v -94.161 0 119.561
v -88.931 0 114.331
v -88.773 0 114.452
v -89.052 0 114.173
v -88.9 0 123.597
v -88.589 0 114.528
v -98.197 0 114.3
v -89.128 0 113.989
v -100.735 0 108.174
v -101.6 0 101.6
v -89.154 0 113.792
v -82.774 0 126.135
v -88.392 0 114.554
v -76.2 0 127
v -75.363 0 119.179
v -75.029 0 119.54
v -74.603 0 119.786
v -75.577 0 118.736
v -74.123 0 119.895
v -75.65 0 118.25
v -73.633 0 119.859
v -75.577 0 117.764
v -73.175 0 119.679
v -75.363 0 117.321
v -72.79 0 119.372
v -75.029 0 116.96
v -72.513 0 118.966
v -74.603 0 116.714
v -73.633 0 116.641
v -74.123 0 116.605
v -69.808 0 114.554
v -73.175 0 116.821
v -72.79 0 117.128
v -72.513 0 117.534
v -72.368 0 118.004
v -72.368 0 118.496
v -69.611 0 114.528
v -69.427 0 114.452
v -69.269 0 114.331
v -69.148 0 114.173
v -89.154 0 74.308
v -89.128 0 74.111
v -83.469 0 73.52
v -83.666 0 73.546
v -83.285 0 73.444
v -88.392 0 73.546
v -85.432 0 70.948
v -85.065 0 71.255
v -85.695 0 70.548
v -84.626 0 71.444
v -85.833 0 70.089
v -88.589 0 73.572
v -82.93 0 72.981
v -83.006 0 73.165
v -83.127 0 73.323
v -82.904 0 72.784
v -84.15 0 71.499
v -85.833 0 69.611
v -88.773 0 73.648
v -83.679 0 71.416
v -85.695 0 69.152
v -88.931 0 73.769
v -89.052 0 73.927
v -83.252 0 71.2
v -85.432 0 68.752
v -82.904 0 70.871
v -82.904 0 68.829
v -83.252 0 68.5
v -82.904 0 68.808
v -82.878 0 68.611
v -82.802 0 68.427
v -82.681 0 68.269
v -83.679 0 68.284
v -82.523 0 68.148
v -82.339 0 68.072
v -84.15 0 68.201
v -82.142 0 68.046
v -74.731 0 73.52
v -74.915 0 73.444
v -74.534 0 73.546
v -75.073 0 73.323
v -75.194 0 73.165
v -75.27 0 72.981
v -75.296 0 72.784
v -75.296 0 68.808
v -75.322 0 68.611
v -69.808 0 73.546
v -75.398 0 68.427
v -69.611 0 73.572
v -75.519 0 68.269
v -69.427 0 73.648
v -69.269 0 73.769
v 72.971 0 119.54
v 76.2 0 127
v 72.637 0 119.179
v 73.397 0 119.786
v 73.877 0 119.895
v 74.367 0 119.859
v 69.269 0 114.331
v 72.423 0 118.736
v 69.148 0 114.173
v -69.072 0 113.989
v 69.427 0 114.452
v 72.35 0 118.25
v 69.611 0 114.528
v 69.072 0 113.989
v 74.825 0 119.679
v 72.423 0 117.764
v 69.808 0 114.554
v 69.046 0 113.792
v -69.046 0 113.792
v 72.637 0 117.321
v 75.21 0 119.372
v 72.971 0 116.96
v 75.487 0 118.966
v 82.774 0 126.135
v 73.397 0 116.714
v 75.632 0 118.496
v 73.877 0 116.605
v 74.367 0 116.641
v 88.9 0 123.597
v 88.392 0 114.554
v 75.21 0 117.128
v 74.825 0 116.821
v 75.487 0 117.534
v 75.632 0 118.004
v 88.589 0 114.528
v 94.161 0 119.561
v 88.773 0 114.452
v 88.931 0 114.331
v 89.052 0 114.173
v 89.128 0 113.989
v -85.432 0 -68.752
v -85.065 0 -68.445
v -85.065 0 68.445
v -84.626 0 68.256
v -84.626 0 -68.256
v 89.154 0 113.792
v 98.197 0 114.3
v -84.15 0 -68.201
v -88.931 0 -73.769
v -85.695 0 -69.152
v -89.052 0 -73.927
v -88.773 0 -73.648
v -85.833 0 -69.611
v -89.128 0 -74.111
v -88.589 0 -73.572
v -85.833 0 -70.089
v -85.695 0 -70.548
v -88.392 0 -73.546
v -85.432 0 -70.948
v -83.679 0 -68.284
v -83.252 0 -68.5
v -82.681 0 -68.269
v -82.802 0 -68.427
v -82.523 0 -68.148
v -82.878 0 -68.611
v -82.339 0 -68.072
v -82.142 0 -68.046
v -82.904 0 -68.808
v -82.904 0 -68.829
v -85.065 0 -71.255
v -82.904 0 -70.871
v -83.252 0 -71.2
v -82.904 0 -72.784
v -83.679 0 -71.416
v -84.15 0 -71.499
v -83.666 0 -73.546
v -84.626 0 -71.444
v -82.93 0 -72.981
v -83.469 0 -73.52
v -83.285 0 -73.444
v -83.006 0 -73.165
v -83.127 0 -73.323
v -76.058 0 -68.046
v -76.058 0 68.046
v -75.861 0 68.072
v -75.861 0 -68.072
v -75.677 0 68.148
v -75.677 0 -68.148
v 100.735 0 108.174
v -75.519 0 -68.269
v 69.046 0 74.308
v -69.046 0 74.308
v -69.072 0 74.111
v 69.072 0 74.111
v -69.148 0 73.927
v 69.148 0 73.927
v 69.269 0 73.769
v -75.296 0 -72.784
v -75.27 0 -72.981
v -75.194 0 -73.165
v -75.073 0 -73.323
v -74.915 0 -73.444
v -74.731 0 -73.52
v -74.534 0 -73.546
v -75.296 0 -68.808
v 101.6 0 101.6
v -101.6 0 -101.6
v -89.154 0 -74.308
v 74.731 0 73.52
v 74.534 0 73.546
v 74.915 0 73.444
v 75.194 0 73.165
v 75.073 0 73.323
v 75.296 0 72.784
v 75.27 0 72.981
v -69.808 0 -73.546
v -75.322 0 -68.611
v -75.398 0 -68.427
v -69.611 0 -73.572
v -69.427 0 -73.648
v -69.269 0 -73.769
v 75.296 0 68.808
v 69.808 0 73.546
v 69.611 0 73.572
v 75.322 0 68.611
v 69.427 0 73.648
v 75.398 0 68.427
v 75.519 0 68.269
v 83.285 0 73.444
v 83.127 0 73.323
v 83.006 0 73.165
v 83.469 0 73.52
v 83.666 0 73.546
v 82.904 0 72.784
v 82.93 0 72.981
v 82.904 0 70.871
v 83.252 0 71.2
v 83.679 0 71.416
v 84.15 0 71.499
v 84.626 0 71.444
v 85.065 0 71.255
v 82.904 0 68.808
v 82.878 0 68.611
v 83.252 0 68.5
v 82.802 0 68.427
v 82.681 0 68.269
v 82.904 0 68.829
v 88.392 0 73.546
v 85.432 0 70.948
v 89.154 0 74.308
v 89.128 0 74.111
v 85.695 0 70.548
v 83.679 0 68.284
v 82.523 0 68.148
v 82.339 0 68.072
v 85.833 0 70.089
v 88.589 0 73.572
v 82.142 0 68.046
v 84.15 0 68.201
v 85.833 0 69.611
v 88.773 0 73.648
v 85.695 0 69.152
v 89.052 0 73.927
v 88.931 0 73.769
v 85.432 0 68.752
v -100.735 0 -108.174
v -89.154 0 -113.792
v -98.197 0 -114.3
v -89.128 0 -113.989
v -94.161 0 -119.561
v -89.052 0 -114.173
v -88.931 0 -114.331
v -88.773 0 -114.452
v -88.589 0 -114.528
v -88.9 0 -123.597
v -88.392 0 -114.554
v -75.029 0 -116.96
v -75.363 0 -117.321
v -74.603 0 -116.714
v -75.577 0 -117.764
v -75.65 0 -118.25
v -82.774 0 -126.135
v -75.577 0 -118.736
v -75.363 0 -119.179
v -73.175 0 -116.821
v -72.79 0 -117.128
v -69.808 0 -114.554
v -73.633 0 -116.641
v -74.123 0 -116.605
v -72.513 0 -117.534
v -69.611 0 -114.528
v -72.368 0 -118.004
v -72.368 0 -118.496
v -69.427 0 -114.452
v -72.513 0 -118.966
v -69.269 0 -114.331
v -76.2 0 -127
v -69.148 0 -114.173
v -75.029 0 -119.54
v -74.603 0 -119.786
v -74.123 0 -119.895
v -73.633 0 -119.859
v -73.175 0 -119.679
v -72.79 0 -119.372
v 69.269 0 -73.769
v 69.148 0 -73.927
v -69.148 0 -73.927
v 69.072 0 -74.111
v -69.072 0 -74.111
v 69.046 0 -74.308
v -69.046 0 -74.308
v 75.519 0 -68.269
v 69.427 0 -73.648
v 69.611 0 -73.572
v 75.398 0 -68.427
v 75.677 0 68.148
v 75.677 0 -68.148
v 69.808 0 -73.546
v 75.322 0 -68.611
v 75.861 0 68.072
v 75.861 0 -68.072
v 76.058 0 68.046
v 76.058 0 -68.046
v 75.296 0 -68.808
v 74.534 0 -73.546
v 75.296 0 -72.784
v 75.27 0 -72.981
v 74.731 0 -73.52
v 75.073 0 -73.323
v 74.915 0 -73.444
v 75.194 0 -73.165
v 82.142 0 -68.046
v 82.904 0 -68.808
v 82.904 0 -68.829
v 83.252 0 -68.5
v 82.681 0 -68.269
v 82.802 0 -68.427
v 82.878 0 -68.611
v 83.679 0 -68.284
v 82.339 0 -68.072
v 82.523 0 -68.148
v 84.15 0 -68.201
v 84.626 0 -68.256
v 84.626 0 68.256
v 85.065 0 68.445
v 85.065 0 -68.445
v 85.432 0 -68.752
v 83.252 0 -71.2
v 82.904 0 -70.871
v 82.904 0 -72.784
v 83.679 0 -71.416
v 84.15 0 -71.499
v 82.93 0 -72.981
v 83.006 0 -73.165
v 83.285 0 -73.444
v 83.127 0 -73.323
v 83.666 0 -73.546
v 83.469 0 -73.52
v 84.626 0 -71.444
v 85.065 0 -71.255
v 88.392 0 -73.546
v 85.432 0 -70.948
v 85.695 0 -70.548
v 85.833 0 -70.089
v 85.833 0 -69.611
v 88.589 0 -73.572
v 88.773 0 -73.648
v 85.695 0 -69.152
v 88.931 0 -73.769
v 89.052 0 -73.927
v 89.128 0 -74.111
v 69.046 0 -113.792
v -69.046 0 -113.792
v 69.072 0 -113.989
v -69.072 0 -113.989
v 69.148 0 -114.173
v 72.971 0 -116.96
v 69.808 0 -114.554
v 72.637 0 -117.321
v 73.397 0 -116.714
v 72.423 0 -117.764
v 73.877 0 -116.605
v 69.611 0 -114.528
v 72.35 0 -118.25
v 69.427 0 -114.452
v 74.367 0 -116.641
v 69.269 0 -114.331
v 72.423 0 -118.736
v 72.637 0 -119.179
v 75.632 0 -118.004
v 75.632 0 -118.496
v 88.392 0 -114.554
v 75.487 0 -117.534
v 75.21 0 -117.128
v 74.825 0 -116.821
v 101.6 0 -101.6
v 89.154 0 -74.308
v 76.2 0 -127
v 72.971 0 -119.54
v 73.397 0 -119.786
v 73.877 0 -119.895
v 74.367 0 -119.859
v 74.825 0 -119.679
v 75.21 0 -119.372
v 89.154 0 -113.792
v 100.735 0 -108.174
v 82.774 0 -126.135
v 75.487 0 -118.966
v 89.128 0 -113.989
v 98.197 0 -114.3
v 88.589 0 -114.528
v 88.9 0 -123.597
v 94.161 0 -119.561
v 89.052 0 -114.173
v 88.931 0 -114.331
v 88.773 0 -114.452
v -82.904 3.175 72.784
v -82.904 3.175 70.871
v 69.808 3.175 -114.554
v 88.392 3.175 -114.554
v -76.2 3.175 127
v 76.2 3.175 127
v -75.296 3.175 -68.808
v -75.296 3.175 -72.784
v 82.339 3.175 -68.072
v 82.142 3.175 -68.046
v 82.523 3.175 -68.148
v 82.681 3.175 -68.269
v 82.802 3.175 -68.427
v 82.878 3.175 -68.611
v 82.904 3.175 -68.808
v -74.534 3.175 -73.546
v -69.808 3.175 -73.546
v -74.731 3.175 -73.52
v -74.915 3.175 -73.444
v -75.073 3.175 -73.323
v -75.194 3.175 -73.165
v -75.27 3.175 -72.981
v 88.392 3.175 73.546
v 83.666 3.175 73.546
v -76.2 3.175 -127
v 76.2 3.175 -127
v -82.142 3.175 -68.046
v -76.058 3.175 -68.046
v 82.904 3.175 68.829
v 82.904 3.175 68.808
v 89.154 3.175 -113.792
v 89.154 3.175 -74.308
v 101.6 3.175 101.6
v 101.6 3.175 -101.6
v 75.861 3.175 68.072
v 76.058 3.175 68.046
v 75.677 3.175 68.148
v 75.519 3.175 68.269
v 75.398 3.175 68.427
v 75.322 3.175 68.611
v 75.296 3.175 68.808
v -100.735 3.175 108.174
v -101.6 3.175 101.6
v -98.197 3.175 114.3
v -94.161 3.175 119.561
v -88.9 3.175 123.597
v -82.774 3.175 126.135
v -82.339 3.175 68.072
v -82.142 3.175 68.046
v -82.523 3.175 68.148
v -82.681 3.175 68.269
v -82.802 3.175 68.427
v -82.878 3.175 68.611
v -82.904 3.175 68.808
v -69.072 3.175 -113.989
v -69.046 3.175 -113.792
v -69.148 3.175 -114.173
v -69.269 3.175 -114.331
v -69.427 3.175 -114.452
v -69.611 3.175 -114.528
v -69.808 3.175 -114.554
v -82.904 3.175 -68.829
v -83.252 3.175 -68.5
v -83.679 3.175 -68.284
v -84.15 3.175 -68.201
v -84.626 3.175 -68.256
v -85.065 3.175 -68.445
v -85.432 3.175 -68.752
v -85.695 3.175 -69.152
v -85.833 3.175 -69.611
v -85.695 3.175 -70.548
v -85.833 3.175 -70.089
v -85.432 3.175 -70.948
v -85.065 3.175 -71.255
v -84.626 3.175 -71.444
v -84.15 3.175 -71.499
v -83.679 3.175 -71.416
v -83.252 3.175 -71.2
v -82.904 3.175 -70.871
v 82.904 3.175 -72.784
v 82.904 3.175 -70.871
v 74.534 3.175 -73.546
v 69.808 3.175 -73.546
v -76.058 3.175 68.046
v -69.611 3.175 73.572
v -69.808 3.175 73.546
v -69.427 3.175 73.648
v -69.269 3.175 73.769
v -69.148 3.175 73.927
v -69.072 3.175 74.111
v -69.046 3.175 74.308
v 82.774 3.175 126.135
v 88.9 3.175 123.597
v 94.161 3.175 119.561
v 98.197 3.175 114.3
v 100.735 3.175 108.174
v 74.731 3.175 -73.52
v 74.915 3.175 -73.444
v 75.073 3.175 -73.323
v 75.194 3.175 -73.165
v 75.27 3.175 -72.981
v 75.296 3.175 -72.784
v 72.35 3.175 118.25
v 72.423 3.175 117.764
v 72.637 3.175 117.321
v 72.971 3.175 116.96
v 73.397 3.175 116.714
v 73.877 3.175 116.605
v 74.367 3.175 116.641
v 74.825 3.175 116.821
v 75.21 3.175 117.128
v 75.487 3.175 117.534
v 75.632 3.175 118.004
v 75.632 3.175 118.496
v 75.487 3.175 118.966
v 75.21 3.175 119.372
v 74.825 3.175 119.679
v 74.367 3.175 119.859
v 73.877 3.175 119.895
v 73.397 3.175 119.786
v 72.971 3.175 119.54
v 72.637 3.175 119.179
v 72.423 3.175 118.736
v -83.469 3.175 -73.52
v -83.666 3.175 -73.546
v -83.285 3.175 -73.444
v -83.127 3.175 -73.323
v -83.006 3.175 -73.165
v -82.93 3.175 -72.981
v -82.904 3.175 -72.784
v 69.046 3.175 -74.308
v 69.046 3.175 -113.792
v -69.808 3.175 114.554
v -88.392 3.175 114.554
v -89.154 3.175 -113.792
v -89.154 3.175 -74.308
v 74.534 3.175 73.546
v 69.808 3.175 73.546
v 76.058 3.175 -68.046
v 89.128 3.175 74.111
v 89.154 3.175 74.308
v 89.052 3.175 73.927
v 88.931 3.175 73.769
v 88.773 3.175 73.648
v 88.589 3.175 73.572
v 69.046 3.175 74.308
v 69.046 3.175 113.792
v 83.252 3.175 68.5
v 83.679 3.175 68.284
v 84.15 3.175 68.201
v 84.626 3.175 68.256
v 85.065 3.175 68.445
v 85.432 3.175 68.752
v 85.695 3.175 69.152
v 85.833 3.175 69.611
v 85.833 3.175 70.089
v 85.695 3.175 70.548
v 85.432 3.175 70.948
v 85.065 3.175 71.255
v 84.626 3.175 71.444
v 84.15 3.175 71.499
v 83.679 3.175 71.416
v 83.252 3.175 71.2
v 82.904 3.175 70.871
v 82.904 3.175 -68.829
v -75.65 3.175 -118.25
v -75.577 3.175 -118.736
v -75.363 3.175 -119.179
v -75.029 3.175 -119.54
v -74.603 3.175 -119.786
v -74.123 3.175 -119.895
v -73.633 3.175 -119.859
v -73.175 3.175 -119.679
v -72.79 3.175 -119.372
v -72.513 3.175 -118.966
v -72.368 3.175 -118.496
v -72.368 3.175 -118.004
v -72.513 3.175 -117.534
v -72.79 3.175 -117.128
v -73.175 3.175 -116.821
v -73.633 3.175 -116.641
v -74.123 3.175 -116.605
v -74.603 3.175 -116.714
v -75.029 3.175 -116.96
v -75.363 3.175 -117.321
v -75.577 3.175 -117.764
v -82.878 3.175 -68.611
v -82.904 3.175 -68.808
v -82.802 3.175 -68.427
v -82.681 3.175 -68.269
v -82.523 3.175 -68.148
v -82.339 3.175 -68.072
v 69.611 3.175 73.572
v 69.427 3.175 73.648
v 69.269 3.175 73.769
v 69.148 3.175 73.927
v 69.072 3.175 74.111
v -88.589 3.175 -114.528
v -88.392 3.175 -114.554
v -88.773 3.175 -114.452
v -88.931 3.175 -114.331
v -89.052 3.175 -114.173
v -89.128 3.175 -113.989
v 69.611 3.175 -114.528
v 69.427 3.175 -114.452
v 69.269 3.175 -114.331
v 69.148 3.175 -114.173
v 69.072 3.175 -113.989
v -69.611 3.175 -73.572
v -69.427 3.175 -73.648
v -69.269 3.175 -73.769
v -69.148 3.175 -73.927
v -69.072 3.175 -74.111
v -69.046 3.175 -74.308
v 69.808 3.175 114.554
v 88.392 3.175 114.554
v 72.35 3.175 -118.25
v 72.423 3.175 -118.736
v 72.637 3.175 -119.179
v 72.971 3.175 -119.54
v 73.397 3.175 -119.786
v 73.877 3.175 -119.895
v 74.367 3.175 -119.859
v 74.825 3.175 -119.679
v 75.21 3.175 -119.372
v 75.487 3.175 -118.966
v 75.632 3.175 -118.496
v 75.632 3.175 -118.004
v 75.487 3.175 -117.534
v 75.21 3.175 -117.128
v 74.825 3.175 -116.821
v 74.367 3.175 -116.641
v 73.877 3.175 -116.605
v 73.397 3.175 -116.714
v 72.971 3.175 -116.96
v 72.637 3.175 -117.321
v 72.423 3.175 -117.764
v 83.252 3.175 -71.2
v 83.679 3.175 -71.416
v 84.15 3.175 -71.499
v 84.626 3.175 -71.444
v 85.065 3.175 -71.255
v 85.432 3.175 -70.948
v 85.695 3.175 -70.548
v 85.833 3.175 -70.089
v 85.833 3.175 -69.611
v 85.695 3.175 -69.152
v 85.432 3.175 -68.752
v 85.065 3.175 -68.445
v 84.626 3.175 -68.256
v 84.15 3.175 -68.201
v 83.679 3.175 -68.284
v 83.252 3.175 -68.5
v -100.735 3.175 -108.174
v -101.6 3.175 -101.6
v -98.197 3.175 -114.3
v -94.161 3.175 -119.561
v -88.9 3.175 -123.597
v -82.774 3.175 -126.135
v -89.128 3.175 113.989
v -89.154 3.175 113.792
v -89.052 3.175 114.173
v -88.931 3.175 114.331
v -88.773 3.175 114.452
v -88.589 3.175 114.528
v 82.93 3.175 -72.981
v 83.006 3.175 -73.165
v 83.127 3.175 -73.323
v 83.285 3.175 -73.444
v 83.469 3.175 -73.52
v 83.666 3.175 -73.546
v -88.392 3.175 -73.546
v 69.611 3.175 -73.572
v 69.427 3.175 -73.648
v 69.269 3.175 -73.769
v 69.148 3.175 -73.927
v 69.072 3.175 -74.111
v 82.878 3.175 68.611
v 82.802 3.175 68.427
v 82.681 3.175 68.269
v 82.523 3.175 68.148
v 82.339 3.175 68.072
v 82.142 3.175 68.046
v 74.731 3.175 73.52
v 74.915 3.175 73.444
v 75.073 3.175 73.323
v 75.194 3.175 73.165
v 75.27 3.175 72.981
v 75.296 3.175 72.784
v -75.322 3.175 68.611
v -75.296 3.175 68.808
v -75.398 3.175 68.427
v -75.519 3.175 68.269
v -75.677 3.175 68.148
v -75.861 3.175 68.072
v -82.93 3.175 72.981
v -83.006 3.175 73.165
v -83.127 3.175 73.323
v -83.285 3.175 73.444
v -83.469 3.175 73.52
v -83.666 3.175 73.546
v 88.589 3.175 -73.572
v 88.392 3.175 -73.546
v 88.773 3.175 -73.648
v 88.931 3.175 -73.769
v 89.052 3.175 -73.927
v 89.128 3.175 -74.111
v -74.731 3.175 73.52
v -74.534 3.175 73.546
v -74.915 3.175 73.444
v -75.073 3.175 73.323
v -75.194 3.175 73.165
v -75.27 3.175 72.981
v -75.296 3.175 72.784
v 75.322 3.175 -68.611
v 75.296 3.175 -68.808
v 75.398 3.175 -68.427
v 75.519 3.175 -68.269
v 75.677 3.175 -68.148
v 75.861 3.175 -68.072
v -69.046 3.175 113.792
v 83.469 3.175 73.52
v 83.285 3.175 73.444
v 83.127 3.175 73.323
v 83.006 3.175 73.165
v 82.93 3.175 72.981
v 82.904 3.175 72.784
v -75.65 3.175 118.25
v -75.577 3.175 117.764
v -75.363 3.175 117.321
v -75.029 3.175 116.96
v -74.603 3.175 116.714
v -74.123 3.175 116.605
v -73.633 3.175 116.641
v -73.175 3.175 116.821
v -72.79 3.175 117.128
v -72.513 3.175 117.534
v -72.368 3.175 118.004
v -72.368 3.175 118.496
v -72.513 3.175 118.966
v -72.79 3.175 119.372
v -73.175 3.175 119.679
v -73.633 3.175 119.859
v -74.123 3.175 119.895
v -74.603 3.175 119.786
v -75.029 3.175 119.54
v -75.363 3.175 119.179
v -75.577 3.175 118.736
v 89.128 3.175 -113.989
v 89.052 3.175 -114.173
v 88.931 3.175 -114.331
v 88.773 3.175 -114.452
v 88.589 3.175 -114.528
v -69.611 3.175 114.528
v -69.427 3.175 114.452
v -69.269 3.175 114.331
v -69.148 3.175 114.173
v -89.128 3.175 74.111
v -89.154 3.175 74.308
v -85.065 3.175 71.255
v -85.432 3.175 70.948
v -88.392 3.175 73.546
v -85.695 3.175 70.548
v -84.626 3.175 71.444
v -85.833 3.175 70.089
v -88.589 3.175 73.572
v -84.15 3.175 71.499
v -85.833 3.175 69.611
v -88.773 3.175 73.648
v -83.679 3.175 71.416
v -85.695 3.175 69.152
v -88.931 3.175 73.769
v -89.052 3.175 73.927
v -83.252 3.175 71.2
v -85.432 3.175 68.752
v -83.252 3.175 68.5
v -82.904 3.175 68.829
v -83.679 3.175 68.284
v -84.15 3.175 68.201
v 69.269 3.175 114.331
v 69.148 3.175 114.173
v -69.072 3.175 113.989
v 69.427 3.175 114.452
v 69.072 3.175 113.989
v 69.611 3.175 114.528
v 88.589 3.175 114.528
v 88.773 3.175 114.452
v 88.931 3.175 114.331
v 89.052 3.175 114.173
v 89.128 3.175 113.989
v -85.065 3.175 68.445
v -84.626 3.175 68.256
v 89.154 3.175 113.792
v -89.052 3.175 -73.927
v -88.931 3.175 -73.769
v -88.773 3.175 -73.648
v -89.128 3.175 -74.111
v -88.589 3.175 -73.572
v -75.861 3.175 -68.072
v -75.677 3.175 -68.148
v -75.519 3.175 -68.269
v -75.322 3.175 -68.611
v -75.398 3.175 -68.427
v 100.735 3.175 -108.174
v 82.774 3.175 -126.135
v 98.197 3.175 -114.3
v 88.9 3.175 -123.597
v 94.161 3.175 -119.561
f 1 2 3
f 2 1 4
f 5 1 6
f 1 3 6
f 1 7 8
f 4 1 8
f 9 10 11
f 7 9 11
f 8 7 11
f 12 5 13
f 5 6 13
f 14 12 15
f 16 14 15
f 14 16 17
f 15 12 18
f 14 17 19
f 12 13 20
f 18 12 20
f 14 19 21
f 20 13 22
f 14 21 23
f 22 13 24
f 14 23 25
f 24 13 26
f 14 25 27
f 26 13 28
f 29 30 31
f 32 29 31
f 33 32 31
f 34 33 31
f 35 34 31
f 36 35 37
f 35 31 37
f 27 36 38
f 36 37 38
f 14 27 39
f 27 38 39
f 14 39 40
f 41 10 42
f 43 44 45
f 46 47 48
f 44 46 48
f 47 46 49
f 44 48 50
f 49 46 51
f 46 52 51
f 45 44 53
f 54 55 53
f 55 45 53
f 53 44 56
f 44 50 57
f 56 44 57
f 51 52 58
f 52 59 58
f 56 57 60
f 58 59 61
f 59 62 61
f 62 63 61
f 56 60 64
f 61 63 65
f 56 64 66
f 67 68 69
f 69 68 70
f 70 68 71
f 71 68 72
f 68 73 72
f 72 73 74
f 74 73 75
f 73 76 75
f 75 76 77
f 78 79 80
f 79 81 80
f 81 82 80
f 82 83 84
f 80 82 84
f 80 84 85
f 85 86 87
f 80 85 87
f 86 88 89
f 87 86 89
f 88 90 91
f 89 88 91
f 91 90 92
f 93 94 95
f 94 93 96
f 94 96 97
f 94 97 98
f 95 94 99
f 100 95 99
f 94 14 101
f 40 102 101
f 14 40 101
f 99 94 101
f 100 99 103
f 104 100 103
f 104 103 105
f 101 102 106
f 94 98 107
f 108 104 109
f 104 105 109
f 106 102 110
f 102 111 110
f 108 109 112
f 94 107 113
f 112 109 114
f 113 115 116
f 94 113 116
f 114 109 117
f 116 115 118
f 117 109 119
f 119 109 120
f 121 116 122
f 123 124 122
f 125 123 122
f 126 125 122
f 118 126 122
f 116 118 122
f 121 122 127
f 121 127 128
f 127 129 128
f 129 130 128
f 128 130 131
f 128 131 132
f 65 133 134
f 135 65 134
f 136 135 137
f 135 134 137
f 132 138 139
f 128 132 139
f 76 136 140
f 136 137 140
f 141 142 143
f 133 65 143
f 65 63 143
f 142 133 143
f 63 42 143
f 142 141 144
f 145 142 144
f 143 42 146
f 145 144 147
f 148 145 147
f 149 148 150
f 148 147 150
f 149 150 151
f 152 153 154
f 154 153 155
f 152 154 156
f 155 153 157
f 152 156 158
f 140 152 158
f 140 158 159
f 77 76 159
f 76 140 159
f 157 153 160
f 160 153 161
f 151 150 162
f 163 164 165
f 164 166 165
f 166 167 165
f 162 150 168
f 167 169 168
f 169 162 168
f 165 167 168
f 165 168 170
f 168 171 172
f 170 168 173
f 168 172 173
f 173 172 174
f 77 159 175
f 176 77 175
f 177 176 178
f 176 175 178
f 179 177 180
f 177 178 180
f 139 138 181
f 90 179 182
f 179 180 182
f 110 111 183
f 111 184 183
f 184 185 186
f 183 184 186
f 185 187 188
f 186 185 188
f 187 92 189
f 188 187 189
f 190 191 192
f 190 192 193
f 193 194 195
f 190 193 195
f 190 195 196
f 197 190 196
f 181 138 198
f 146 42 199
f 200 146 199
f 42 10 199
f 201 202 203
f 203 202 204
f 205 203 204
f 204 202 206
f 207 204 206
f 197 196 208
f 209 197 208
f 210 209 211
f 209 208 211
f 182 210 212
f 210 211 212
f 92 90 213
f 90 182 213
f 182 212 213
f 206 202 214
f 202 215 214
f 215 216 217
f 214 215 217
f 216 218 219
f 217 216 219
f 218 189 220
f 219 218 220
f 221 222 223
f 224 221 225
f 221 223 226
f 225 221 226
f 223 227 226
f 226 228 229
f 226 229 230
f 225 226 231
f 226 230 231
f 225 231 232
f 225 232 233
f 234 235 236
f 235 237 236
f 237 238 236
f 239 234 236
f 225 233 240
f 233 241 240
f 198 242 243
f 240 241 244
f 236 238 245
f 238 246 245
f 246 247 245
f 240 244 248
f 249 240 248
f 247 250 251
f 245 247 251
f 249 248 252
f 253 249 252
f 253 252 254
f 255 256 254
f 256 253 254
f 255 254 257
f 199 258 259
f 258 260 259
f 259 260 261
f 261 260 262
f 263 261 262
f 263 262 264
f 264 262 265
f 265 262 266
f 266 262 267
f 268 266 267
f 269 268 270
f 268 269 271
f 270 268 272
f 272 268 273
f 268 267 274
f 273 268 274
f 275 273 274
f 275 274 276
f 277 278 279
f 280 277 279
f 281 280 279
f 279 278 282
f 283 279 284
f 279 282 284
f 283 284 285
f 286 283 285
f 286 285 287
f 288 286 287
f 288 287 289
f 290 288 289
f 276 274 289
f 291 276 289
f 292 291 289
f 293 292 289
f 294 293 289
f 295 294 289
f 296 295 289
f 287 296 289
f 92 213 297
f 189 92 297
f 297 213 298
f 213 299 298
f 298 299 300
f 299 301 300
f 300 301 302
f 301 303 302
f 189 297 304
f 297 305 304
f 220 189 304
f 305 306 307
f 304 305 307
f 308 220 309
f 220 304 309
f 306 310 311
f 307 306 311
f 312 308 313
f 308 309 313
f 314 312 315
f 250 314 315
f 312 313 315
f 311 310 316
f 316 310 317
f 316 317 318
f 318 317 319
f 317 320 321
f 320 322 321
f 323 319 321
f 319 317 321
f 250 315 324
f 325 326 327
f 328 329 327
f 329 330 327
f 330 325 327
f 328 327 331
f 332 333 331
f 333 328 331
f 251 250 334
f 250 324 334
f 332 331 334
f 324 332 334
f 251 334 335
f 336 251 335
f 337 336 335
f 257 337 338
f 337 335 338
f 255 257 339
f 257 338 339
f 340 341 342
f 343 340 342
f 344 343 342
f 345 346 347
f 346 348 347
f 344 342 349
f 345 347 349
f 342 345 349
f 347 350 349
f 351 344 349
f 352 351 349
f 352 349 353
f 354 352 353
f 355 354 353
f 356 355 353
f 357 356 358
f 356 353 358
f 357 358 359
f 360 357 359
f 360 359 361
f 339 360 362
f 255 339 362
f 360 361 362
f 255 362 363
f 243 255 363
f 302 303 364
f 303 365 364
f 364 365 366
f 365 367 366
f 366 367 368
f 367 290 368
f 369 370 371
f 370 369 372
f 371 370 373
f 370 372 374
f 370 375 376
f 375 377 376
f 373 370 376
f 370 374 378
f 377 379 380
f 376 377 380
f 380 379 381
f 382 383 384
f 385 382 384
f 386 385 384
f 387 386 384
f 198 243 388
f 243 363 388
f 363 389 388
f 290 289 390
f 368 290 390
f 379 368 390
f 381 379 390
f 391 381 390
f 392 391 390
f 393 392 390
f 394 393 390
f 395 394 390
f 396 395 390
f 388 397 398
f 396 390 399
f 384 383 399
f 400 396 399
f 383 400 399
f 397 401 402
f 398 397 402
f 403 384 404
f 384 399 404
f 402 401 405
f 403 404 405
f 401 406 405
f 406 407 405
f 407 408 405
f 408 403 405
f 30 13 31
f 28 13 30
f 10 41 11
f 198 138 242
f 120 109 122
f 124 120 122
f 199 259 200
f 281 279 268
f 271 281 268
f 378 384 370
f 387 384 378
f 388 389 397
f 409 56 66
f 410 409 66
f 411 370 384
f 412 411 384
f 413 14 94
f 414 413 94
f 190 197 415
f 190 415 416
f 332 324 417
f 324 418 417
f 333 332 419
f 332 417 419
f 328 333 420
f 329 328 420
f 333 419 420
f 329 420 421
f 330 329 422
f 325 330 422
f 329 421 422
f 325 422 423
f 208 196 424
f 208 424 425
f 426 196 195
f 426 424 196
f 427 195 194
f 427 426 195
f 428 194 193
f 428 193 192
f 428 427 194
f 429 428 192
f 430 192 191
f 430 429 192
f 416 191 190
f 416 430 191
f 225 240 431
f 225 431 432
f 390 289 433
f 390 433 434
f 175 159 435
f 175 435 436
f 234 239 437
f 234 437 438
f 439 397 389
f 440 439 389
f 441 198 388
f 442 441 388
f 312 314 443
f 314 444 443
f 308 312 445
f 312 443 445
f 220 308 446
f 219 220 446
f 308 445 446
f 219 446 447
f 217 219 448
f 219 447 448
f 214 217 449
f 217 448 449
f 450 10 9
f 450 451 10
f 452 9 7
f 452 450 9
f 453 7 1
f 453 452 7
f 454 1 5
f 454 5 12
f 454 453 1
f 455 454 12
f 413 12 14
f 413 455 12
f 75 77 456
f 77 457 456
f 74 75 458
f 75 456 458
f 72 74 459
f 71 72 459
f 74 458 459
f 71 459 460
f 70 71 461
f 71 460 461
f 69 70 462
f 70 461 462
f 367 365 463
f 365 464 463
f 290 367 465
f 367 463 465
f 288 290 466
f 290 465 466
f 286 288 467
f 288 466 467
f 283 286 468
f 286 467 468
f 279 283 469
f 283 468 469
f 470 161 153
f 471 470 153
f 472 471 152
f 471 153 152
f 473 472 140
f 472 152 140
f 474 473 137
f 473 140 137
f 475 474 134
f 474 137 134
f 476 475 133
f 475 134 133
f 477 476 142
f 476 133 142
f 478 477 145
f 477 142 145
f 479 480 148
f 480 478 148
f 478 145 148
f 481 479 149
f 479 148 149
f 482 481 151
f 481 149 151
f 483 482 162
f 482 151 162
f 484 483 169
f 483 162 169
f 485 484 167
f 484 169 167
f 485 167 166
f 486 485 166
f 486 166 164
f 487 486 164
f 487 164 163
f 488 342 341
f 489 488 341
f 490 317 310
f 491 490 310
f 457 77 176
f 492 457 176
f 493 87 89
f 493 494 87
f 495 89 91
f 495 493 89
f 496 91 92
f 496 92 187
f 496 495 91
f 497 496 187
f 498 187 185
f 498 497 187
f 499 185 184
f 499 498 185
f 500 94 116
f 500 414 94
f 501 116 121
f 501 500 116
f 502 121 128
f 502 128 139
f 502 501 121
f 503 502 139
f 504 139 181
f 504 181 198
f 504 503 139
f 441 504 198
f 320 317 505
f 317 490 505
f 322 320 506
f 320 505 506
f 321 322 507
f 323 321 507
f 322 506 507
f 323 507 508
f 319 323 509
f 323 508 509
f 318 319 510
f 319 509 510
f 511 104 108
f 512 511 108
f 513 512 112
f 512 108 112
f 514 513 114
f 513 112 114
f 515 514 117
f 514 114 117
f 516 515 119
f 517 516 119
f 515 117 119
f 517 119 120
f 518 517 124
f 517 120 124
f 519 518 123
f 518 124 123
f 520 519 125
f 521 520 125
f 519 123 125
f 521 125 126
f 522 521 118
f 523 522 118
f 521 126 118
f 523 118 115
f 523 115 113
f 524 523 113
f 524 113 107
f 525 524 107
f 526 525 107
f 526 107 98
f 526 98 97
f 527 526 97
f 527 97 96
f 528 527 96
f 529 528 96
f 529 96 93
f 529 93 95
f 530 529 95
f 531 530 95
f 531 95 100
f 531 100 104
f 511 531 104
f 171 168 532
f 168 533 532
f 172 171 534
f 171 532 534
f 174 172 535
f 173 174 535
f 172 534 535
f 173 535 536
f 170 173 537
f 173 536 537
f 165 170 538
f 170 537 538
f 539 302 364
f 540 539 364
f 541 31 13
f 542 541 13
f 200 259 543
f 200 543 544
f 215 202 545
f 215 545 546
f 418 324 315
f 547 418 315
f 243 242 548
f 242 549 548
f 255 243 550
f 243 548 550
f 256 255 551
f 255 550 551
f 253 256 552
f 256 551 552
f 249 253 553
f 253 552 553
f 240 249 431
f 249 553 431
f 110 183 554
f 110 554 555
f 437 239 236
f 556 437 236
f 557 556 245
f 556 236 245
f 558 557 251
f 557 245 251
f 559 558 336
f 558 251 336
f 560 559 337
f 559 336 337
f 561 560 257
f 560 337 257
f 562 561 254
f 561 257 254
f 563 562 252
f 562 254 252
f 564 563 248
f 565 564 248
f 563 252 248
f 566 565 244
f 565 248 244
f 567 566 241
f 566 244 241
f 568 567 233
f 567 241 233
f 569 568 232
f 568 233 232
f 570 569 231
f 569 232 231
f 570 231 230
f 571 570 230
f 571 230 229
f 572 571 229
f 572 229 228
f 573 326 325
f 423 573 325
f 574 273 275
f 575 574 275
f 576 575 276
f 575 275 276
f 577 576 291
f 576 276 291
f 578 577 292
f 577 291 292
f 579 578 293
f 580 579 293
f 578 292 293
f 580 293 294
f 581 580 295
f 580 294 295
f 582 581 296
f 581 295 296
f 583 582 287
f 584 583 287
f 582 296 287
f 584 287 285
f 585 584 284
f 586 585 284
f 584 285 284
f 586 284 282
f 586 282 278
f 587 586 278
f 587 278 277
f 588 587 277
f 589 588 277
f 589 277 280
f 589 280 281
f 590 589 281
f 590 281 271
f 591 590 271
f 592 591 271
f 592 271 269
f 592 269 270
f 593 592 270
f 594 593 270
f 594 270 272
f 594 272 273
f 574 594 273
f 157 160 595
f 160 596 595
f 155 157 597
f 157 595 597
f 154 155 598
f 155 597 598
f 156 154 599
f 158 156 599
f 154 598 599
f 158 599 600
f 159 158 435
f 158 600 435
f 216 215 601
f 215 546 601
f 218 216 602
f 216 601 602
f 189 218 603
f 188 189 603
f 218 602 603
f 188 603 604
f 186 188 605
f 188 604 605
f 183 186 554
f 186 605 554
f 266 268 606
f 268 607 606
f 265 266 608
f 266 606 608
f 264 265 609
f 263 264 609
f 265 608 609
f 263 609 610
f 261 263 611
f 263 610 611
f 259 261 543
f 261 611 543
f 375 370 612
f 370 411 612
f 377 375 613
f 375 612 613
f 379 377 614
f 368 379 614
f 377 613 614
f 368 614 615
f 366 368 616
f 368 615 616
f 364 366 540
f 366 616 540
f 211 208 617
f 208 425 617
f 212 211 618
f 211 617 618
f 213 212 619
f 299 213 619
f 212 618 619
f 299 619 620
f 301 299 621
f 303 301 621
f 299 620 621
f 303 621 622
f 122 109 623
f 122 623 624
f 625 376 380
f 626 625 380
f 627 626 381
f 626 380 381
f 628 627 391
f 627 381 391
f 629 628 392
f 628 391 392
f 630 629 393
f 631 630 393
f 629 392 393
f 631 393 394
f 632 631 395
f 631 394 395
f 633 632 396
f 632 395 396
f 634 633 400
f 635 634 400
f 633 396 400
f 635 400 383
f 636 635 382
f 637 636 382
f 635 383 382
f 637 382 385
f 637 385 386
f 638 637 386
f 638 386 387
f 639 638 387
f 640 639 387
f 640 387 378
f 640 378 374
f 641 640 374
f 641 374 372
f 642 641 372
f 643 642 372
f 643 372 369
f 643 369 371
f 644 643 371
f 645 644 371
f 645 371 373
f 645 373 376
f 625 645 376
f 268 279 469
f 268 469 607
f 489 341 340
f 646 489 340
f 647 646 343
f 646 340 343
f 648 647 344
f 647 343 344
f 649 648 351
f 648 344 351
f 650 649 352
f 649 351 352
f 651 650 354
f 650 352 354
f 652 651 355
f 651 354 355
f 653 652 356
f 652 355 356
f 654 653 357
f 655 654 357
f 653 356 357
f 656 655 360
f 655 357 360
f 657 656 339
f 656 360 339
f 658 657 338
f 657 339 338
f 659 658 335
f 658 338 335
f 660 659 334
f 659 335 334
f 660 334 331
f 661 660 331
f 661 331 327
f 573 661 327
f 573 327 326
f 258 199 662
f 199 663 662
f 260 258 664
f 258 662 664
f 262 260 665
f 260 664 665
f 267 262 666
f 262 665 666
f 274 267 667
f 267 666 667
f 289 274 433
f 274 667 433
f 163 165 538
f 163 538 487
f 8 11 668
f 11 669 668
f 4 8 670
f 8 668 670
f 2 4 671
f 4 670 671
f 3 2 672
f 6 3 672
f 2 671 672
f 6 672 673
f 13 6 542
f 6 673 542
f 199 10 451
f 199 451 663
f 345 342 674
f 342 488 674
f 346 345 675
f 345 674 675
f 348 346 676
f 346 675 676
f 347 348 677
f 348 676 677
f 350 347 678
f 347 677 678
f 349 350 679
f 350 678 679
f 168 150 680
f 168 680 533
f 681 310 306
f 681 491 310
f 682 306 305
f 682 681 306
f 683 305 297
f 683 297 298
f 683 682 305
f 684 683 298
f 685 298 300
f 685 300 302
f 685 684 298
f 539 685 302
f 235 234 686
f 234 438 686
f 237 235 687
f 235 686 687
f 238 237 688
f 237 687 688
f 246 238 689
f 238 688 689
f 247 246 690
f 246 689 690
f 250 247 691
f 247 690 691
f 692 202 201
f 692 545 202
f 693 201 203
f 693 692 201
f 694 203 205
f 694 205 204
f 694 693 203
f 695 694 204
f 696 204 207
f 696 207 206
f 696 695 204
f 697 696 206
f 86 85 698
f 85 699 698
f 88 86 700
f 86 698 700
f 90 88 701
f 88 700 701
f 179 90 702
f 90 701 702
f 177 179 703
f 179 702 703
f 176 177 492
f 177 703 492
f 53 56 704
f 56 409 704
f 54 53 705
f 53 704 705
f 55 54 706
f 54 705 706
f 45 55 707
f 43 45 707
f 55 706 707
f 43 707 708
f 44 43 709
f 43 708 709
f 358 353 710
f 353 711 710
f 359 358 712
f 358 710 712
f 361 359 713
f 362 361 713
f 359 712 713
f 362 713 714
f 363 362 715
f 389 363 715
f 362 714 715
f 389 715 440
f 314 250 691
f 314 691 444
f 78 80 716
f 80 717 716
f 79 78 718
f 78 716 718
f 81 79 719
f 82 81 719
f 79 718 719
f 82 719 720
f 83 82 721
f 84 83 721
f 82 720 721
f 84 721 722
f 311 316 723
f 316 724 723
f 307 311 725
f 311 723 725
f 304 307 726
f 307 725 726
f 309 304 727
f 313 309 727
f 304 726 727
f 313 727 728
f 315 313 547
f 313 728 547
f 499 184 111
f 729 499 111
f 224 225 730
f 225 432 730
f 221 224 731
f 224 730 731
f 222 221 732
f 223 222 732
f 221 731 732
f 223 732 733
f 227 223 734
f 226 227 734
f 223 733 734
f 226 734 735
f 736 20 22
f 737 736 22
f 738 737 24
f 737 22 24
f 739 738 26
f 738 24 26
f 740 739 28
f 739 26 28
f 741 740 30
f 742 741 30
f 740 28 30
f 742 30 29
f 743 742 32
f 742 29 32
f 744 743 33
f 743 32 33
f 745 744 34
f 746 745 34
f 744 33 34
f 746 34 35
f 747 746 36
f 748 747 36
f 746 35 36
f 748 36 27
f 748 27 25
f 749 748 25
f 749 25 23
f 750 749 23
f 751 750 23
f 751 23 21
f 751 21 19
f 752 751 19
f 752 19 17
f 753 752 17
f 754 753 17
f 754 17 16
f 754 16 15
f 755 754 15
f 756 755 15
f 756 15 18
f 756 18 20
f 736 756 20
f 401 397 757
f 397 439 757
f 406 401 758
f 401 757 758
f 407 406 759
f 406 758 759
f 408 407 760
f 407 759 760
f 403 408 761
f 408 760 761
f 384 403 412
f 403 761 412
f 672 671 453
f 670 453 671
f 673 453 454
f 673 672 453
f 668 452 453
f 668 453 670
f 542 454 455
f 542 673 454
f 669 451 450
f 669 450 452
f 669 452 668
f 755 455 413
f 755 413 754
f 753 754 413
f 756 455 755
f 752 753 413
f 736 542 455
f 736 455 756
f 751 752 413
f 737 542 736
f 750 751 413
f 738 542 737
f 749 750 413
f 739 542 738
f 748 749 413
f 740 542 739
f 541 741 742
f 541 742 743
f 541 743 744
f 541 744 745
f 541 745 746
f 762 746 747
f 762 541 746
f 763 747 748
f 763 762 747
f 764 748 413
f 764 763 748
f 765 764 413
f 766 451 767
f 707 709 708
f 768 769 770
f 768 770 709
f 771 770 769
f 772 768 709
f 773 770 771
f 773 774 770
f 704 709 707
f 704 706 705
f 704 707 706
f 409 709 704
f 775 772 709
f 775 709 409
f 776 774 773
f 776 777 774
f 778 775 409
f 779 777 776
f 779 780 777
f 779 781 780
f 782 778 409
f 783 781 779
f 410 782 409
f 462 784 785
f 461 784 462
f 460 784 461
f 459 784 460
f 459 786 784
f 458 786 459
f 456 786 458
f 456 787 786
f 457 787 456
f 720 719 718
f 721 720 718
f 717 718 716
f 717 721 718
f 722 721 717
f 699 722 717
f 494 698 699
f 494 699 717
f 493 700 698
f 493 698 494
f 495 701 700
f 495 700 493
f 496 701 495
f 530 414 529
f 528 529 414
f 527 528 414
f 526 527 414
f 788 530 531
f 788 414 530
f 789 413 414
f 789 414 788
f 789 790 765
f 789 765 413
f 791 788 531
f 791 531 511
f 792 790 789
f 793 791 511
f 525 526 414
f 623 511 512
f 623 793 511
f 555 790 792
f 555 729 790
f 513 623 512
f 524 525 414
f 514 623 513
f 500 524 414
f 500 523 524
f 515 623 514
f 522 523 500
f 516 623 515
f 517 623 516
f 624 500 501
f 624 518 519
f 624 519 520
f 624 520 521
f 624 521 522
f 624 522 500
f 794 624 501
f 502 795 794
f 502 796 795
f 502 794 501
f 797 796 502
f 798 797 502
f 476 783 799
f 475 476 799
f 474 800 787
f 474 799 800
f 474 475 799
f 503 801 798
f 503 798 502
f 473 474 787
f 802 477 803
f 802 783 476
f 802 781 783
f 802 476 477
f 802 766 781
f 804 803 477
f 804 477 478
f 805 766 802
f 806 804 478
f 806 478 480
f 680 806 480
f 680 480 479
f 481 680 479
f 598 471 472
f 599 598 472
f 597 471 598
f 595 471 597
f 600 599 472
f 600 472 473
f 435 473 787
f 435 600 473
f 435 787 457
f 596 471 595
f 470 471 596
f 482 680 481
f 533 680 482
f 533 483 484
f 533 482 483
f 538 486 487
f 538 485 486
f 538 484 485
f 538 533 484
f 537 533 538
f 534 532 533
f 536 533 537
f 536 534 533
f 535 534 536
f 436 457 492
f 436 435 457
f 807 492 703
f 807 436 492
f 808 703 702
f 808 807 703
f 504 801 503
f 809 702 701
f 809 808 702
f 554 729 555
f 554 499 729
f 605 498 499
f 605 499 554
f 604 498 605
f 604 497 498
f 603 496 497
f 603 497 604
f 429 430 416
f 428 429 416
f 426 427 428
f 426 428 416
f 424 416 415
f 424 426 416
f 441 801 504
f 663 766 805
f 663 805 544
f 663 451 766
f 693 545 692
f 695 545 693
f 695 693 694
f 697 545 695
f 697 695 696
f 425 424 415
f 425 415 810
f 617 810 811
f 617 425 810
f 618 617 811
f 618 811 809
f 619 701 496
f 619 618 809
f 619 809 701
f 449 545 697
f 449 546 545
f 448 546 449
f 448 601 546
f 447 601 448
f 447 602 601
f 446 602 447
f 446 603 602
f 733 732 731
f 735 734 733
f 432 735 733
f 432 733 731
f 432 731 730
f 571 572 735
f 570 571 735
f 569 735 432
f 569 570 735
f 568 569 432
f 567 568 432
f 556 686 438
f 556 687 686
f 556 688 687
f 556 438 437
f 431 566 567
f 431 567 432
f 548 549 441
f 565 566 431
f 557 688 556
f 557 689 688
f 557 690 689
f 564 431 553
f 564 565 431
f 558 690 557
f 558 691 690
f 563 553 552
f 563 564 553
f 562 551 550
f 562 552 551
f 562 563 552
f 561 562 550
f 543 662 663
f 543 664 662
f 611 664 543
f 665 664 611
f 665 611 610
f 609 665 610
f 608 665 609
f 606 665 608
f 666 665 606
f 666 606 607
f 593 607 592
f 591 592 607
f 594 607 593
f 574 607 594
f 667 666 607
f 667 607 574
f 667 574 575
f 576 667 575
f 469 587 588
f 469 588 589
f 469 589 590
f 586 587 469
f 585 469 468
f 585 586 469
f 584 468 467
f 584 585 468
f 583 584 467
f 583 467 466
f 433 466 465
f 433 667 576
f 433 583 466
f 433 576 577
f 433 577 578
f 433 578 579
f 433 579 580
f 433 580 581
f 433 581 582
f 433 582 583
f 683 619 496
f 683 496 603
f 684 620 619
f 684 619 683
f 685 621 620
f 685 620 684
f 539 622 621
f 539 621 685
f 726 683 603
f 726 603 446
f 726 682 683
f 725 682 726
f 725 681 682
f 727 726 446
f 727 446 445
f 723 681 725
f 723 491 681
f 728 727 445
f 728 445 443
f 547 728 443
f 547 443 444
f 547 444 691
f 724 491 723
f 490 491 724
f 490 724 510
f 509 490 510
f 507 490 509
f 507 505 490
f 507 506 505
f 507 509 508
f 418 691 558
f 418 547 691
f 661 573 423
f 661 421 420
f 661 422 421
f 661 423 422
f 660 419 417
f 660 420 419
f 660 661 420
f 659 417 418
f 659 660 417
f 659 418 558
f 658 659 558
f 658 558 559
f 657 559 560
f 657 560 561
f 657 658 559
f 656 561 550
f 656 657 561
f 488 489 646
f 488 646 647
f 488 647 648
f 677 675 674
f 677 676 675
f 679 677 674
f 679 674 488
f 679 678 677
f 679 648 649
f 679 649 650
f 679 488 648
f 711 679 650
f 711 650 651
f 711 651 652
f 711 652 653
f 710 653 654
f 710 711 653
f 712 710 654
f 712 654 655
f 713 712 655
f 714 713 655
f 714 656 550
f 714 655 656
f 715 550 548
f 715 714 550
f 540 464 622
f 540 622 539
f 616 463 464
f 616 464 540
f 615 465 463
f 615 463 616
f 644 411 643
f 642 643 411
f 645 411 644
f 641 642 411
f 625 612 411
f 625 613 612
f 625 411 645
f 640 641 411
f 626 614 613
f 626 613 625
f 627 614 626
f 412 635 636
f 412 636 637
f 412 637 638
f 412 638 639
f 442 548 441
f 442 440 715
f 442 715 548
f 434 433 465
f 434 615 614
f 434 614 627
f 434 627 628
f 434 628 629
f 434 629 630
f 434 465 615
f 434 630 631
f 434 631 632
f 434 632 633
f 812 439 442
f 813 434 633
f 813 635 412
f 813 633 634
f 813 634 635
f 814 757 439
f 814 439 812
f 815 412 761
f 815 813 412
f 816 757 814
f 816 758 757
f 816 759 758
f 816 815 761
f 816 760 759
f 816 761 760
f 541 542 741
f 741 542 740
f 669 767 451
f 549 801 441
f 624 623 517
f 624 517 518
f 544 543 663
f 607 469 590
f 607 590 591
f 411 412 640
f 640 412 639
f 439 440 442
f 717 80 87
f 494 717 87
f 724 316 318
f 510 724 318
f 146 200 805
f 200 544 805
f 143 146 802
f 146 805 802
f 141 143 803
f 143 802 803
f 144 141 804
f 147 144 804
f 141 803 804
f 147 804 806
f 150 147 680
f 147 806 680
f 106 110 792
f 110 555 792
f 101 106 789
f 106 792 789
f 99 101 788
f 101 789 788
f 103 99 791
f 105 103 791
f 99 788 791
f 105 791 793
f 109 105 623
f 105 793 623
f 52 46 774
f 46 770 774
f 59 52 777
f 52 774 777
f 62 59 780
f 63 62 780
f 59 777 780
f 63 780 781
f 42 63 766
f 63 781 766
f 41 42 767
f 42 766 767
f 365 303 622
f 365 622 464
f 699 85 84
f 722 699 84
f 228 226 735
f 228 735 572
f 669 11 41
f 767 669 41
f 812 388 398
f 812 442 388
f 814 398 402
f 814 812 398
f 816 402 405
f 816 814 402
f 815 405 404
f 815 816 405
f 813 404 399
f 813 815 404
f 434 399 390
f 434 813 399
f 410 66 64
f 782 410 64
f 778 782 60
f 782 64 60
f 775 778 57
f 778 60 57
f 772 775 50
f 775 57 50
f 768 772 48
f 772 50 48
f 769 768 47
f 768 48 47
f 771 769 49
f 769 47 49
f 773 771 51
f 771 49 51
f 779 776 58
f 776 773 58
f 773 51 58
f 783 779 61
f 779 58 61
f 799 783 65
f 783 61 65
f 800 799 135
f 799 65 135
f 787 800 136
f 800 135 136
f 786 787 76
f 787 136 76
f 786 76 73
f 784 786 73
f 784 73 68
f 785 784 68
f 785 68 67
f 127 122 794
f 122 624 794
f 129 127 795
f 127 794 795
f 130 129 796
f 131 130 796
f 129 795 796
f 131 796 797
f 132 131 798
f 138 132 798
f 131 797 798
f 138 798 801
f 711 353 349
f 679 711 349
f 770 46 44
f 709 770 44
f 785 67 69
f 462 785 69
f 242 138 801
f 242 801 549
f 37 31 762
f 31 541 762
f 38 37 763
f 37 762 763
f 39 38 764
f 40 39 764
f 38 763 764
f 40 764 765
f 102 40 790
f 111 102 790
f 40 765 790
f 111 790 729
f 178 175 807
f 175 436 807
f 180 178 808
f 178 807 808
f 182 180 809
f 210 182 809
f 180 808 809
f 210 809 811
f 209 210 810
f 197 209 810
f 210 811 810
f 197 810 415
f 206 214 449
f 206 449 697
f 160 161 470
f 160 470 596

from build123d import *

# Parameters (mm, degrees)
SKETCH1_W             = 203.2
SKETCH1_H             = 254
BOSS_EXTRUDE1_DEPTH   = 3.175
FILLET1_R             = 25.4
CUT_EXTRUDE1_DEPTH    = 25.4
FILLET2_R             = 0.762
M4X0_7_TAPPED_HOLE3_D = 3.3


with BuildPart() as part:
    # Sketch1 → Boss-Extrude1 (new body)
    with BuildSketch(Plane(origin=(0, 0, 0), x_dir=(1, 0, 0), z_dir=(0, 1, 0))):
        Rectangle(SKETCH1_W, SKETCH1_H)
    extrude(amount=BOSS_EXTRUDE1_DEPTH)

    # Fillet1
    fillet1_edges = [part.edges().sort_by_distance(p)[0] for p in [
        (101.6, 1.5875, 127),
        (-101.6, 1.5875, 127),
        (-101.6, 1.5875, -127),
        (101.6, 1.5875, -127),
    ]]
    fillet(fillet1_edges, radius=FILLET1_R)

    # Sketch2 → Cut-Extrude1 (cut)
    with BuildSketch(Plane.XZ):
        Polygon((-69.046, 73.546000013), (-69.046, 114.554000013), (-89.154, 114.554000013), (-89.154, 73.546000013), (-82.904, 73.546000013), (-82.904, 68.046000013), (-75.296, 68.046000013), (-75.296, 73.546000013), align=None)
        Polygon((75.296, 73.546000013), (69.046, 73.546000013), (69.046, 114.554000013), (89.154, 114.554000013), (89.154, 73.546000013), (82.904, 73.546000013), (82.904, 68.046000013), (75.296, 68.046000013), align=None)
        Polygon((69.046, -73.546000013), (69.046, -114.554000013), (89.154, -114.554000013), (89.154, -73.546000013), (82.904, -73.546000013), (82.904, -68.046000013), (75.296, -68.046000013), (75.296, -73.546000013), align=None)
        Polygon((-75.296, -73.546000013), (-69.046, -73.546000013), (-69.046, -114.554000013), (-89.154, -114.554000013), (-89.154, -73.546000013), (-82.904, -73.546000013), (-82.904, -68.046000013), (-75.296, -68.046000013), align=None)
    extrude(amount=-CUT_EXTRUDE1_DEPTH, mode=Mode.SUBTRACT)

    # Fillet2
    fillet2_edges = [part.edges().sort_by_distance(p)[0] for p in [
        (-69.046, 1.5875, 73.546000013),
        (-75.296, 1.5875, 73.546000013),
        (-75.296, 1.5875, 68.046000013),
        (-82.904, 1.5875, 68.046000013),
        (-82.904, 1.5875, 73.546000013),
        (-89.154, 1.5875, 73.546000013),
        (-89.154, 1.5875, 114.554000013),
        (-69.046, 1.5875, 114.554000013),
        (-82.904, 1.5875, -68.046000013),
        (-75.296, 1.5875, -68.046000013),
        (-75.296, 1.5875, -73.546000013),
        (-69.046, 1.5875, -73.546000013),
        (-69.046, 1.5875, -114.554000013),
        (-89.154, 1.5875, -114.554000013),
        (-89.154, 1.5875, -73.546000013),
        (-82.904, 1.5875, -73.546000013),
        (69.046, 1.5875, -73.546000013),
        (75.296, 1.5875, -73.546000013),
        (75.296, 1.5875, -68.046000013),
        (82.904, 1.5875, -68.046000013),
        (82.904, 1.5875, -73.546000013),
        (89.154, 1.5875, -73.546000013),
        (89.154, 1.5875, -114.554000013),
        (69.046, 1.5875, -114.554000013),
        (82.904, 1.5875, 68.046000013),
        (75.296, 1.5875, 68.046000013),
        (75.296, 1.5875, 73.546000013),
        (69.046, 1.5875, 73.546000013),
        (69.046, 1.5875, 114.554000013),
        (89.154, 1.5875, 114.554000013),
        (89.154, 1.5875, 73.546000013),
        (82.904, 1.5875, 73.546000013),
    ]]
    fillet(fillet2_edges, radius=FILLET2_R)

    # M4x0.7 Tapped Hole3 (through all)
    with Locations(Plane(origin=(0, 3.175, 0), x_dir=(1, 0, 0), z_dir=(0, 1, 0))):
        with Locations((-84.2, -69.850000013), (-74, -118.250000013), (74, -118.250000013), (84.2, -69.850000013), (84.2, 69.850000013), (74, 118.250000013), (-74, 118.250000013), (-84.2, 69.850000013)):
            Hole(M4X0_7_TAPPED_HOLE3_D / 2)


solid = part.part
